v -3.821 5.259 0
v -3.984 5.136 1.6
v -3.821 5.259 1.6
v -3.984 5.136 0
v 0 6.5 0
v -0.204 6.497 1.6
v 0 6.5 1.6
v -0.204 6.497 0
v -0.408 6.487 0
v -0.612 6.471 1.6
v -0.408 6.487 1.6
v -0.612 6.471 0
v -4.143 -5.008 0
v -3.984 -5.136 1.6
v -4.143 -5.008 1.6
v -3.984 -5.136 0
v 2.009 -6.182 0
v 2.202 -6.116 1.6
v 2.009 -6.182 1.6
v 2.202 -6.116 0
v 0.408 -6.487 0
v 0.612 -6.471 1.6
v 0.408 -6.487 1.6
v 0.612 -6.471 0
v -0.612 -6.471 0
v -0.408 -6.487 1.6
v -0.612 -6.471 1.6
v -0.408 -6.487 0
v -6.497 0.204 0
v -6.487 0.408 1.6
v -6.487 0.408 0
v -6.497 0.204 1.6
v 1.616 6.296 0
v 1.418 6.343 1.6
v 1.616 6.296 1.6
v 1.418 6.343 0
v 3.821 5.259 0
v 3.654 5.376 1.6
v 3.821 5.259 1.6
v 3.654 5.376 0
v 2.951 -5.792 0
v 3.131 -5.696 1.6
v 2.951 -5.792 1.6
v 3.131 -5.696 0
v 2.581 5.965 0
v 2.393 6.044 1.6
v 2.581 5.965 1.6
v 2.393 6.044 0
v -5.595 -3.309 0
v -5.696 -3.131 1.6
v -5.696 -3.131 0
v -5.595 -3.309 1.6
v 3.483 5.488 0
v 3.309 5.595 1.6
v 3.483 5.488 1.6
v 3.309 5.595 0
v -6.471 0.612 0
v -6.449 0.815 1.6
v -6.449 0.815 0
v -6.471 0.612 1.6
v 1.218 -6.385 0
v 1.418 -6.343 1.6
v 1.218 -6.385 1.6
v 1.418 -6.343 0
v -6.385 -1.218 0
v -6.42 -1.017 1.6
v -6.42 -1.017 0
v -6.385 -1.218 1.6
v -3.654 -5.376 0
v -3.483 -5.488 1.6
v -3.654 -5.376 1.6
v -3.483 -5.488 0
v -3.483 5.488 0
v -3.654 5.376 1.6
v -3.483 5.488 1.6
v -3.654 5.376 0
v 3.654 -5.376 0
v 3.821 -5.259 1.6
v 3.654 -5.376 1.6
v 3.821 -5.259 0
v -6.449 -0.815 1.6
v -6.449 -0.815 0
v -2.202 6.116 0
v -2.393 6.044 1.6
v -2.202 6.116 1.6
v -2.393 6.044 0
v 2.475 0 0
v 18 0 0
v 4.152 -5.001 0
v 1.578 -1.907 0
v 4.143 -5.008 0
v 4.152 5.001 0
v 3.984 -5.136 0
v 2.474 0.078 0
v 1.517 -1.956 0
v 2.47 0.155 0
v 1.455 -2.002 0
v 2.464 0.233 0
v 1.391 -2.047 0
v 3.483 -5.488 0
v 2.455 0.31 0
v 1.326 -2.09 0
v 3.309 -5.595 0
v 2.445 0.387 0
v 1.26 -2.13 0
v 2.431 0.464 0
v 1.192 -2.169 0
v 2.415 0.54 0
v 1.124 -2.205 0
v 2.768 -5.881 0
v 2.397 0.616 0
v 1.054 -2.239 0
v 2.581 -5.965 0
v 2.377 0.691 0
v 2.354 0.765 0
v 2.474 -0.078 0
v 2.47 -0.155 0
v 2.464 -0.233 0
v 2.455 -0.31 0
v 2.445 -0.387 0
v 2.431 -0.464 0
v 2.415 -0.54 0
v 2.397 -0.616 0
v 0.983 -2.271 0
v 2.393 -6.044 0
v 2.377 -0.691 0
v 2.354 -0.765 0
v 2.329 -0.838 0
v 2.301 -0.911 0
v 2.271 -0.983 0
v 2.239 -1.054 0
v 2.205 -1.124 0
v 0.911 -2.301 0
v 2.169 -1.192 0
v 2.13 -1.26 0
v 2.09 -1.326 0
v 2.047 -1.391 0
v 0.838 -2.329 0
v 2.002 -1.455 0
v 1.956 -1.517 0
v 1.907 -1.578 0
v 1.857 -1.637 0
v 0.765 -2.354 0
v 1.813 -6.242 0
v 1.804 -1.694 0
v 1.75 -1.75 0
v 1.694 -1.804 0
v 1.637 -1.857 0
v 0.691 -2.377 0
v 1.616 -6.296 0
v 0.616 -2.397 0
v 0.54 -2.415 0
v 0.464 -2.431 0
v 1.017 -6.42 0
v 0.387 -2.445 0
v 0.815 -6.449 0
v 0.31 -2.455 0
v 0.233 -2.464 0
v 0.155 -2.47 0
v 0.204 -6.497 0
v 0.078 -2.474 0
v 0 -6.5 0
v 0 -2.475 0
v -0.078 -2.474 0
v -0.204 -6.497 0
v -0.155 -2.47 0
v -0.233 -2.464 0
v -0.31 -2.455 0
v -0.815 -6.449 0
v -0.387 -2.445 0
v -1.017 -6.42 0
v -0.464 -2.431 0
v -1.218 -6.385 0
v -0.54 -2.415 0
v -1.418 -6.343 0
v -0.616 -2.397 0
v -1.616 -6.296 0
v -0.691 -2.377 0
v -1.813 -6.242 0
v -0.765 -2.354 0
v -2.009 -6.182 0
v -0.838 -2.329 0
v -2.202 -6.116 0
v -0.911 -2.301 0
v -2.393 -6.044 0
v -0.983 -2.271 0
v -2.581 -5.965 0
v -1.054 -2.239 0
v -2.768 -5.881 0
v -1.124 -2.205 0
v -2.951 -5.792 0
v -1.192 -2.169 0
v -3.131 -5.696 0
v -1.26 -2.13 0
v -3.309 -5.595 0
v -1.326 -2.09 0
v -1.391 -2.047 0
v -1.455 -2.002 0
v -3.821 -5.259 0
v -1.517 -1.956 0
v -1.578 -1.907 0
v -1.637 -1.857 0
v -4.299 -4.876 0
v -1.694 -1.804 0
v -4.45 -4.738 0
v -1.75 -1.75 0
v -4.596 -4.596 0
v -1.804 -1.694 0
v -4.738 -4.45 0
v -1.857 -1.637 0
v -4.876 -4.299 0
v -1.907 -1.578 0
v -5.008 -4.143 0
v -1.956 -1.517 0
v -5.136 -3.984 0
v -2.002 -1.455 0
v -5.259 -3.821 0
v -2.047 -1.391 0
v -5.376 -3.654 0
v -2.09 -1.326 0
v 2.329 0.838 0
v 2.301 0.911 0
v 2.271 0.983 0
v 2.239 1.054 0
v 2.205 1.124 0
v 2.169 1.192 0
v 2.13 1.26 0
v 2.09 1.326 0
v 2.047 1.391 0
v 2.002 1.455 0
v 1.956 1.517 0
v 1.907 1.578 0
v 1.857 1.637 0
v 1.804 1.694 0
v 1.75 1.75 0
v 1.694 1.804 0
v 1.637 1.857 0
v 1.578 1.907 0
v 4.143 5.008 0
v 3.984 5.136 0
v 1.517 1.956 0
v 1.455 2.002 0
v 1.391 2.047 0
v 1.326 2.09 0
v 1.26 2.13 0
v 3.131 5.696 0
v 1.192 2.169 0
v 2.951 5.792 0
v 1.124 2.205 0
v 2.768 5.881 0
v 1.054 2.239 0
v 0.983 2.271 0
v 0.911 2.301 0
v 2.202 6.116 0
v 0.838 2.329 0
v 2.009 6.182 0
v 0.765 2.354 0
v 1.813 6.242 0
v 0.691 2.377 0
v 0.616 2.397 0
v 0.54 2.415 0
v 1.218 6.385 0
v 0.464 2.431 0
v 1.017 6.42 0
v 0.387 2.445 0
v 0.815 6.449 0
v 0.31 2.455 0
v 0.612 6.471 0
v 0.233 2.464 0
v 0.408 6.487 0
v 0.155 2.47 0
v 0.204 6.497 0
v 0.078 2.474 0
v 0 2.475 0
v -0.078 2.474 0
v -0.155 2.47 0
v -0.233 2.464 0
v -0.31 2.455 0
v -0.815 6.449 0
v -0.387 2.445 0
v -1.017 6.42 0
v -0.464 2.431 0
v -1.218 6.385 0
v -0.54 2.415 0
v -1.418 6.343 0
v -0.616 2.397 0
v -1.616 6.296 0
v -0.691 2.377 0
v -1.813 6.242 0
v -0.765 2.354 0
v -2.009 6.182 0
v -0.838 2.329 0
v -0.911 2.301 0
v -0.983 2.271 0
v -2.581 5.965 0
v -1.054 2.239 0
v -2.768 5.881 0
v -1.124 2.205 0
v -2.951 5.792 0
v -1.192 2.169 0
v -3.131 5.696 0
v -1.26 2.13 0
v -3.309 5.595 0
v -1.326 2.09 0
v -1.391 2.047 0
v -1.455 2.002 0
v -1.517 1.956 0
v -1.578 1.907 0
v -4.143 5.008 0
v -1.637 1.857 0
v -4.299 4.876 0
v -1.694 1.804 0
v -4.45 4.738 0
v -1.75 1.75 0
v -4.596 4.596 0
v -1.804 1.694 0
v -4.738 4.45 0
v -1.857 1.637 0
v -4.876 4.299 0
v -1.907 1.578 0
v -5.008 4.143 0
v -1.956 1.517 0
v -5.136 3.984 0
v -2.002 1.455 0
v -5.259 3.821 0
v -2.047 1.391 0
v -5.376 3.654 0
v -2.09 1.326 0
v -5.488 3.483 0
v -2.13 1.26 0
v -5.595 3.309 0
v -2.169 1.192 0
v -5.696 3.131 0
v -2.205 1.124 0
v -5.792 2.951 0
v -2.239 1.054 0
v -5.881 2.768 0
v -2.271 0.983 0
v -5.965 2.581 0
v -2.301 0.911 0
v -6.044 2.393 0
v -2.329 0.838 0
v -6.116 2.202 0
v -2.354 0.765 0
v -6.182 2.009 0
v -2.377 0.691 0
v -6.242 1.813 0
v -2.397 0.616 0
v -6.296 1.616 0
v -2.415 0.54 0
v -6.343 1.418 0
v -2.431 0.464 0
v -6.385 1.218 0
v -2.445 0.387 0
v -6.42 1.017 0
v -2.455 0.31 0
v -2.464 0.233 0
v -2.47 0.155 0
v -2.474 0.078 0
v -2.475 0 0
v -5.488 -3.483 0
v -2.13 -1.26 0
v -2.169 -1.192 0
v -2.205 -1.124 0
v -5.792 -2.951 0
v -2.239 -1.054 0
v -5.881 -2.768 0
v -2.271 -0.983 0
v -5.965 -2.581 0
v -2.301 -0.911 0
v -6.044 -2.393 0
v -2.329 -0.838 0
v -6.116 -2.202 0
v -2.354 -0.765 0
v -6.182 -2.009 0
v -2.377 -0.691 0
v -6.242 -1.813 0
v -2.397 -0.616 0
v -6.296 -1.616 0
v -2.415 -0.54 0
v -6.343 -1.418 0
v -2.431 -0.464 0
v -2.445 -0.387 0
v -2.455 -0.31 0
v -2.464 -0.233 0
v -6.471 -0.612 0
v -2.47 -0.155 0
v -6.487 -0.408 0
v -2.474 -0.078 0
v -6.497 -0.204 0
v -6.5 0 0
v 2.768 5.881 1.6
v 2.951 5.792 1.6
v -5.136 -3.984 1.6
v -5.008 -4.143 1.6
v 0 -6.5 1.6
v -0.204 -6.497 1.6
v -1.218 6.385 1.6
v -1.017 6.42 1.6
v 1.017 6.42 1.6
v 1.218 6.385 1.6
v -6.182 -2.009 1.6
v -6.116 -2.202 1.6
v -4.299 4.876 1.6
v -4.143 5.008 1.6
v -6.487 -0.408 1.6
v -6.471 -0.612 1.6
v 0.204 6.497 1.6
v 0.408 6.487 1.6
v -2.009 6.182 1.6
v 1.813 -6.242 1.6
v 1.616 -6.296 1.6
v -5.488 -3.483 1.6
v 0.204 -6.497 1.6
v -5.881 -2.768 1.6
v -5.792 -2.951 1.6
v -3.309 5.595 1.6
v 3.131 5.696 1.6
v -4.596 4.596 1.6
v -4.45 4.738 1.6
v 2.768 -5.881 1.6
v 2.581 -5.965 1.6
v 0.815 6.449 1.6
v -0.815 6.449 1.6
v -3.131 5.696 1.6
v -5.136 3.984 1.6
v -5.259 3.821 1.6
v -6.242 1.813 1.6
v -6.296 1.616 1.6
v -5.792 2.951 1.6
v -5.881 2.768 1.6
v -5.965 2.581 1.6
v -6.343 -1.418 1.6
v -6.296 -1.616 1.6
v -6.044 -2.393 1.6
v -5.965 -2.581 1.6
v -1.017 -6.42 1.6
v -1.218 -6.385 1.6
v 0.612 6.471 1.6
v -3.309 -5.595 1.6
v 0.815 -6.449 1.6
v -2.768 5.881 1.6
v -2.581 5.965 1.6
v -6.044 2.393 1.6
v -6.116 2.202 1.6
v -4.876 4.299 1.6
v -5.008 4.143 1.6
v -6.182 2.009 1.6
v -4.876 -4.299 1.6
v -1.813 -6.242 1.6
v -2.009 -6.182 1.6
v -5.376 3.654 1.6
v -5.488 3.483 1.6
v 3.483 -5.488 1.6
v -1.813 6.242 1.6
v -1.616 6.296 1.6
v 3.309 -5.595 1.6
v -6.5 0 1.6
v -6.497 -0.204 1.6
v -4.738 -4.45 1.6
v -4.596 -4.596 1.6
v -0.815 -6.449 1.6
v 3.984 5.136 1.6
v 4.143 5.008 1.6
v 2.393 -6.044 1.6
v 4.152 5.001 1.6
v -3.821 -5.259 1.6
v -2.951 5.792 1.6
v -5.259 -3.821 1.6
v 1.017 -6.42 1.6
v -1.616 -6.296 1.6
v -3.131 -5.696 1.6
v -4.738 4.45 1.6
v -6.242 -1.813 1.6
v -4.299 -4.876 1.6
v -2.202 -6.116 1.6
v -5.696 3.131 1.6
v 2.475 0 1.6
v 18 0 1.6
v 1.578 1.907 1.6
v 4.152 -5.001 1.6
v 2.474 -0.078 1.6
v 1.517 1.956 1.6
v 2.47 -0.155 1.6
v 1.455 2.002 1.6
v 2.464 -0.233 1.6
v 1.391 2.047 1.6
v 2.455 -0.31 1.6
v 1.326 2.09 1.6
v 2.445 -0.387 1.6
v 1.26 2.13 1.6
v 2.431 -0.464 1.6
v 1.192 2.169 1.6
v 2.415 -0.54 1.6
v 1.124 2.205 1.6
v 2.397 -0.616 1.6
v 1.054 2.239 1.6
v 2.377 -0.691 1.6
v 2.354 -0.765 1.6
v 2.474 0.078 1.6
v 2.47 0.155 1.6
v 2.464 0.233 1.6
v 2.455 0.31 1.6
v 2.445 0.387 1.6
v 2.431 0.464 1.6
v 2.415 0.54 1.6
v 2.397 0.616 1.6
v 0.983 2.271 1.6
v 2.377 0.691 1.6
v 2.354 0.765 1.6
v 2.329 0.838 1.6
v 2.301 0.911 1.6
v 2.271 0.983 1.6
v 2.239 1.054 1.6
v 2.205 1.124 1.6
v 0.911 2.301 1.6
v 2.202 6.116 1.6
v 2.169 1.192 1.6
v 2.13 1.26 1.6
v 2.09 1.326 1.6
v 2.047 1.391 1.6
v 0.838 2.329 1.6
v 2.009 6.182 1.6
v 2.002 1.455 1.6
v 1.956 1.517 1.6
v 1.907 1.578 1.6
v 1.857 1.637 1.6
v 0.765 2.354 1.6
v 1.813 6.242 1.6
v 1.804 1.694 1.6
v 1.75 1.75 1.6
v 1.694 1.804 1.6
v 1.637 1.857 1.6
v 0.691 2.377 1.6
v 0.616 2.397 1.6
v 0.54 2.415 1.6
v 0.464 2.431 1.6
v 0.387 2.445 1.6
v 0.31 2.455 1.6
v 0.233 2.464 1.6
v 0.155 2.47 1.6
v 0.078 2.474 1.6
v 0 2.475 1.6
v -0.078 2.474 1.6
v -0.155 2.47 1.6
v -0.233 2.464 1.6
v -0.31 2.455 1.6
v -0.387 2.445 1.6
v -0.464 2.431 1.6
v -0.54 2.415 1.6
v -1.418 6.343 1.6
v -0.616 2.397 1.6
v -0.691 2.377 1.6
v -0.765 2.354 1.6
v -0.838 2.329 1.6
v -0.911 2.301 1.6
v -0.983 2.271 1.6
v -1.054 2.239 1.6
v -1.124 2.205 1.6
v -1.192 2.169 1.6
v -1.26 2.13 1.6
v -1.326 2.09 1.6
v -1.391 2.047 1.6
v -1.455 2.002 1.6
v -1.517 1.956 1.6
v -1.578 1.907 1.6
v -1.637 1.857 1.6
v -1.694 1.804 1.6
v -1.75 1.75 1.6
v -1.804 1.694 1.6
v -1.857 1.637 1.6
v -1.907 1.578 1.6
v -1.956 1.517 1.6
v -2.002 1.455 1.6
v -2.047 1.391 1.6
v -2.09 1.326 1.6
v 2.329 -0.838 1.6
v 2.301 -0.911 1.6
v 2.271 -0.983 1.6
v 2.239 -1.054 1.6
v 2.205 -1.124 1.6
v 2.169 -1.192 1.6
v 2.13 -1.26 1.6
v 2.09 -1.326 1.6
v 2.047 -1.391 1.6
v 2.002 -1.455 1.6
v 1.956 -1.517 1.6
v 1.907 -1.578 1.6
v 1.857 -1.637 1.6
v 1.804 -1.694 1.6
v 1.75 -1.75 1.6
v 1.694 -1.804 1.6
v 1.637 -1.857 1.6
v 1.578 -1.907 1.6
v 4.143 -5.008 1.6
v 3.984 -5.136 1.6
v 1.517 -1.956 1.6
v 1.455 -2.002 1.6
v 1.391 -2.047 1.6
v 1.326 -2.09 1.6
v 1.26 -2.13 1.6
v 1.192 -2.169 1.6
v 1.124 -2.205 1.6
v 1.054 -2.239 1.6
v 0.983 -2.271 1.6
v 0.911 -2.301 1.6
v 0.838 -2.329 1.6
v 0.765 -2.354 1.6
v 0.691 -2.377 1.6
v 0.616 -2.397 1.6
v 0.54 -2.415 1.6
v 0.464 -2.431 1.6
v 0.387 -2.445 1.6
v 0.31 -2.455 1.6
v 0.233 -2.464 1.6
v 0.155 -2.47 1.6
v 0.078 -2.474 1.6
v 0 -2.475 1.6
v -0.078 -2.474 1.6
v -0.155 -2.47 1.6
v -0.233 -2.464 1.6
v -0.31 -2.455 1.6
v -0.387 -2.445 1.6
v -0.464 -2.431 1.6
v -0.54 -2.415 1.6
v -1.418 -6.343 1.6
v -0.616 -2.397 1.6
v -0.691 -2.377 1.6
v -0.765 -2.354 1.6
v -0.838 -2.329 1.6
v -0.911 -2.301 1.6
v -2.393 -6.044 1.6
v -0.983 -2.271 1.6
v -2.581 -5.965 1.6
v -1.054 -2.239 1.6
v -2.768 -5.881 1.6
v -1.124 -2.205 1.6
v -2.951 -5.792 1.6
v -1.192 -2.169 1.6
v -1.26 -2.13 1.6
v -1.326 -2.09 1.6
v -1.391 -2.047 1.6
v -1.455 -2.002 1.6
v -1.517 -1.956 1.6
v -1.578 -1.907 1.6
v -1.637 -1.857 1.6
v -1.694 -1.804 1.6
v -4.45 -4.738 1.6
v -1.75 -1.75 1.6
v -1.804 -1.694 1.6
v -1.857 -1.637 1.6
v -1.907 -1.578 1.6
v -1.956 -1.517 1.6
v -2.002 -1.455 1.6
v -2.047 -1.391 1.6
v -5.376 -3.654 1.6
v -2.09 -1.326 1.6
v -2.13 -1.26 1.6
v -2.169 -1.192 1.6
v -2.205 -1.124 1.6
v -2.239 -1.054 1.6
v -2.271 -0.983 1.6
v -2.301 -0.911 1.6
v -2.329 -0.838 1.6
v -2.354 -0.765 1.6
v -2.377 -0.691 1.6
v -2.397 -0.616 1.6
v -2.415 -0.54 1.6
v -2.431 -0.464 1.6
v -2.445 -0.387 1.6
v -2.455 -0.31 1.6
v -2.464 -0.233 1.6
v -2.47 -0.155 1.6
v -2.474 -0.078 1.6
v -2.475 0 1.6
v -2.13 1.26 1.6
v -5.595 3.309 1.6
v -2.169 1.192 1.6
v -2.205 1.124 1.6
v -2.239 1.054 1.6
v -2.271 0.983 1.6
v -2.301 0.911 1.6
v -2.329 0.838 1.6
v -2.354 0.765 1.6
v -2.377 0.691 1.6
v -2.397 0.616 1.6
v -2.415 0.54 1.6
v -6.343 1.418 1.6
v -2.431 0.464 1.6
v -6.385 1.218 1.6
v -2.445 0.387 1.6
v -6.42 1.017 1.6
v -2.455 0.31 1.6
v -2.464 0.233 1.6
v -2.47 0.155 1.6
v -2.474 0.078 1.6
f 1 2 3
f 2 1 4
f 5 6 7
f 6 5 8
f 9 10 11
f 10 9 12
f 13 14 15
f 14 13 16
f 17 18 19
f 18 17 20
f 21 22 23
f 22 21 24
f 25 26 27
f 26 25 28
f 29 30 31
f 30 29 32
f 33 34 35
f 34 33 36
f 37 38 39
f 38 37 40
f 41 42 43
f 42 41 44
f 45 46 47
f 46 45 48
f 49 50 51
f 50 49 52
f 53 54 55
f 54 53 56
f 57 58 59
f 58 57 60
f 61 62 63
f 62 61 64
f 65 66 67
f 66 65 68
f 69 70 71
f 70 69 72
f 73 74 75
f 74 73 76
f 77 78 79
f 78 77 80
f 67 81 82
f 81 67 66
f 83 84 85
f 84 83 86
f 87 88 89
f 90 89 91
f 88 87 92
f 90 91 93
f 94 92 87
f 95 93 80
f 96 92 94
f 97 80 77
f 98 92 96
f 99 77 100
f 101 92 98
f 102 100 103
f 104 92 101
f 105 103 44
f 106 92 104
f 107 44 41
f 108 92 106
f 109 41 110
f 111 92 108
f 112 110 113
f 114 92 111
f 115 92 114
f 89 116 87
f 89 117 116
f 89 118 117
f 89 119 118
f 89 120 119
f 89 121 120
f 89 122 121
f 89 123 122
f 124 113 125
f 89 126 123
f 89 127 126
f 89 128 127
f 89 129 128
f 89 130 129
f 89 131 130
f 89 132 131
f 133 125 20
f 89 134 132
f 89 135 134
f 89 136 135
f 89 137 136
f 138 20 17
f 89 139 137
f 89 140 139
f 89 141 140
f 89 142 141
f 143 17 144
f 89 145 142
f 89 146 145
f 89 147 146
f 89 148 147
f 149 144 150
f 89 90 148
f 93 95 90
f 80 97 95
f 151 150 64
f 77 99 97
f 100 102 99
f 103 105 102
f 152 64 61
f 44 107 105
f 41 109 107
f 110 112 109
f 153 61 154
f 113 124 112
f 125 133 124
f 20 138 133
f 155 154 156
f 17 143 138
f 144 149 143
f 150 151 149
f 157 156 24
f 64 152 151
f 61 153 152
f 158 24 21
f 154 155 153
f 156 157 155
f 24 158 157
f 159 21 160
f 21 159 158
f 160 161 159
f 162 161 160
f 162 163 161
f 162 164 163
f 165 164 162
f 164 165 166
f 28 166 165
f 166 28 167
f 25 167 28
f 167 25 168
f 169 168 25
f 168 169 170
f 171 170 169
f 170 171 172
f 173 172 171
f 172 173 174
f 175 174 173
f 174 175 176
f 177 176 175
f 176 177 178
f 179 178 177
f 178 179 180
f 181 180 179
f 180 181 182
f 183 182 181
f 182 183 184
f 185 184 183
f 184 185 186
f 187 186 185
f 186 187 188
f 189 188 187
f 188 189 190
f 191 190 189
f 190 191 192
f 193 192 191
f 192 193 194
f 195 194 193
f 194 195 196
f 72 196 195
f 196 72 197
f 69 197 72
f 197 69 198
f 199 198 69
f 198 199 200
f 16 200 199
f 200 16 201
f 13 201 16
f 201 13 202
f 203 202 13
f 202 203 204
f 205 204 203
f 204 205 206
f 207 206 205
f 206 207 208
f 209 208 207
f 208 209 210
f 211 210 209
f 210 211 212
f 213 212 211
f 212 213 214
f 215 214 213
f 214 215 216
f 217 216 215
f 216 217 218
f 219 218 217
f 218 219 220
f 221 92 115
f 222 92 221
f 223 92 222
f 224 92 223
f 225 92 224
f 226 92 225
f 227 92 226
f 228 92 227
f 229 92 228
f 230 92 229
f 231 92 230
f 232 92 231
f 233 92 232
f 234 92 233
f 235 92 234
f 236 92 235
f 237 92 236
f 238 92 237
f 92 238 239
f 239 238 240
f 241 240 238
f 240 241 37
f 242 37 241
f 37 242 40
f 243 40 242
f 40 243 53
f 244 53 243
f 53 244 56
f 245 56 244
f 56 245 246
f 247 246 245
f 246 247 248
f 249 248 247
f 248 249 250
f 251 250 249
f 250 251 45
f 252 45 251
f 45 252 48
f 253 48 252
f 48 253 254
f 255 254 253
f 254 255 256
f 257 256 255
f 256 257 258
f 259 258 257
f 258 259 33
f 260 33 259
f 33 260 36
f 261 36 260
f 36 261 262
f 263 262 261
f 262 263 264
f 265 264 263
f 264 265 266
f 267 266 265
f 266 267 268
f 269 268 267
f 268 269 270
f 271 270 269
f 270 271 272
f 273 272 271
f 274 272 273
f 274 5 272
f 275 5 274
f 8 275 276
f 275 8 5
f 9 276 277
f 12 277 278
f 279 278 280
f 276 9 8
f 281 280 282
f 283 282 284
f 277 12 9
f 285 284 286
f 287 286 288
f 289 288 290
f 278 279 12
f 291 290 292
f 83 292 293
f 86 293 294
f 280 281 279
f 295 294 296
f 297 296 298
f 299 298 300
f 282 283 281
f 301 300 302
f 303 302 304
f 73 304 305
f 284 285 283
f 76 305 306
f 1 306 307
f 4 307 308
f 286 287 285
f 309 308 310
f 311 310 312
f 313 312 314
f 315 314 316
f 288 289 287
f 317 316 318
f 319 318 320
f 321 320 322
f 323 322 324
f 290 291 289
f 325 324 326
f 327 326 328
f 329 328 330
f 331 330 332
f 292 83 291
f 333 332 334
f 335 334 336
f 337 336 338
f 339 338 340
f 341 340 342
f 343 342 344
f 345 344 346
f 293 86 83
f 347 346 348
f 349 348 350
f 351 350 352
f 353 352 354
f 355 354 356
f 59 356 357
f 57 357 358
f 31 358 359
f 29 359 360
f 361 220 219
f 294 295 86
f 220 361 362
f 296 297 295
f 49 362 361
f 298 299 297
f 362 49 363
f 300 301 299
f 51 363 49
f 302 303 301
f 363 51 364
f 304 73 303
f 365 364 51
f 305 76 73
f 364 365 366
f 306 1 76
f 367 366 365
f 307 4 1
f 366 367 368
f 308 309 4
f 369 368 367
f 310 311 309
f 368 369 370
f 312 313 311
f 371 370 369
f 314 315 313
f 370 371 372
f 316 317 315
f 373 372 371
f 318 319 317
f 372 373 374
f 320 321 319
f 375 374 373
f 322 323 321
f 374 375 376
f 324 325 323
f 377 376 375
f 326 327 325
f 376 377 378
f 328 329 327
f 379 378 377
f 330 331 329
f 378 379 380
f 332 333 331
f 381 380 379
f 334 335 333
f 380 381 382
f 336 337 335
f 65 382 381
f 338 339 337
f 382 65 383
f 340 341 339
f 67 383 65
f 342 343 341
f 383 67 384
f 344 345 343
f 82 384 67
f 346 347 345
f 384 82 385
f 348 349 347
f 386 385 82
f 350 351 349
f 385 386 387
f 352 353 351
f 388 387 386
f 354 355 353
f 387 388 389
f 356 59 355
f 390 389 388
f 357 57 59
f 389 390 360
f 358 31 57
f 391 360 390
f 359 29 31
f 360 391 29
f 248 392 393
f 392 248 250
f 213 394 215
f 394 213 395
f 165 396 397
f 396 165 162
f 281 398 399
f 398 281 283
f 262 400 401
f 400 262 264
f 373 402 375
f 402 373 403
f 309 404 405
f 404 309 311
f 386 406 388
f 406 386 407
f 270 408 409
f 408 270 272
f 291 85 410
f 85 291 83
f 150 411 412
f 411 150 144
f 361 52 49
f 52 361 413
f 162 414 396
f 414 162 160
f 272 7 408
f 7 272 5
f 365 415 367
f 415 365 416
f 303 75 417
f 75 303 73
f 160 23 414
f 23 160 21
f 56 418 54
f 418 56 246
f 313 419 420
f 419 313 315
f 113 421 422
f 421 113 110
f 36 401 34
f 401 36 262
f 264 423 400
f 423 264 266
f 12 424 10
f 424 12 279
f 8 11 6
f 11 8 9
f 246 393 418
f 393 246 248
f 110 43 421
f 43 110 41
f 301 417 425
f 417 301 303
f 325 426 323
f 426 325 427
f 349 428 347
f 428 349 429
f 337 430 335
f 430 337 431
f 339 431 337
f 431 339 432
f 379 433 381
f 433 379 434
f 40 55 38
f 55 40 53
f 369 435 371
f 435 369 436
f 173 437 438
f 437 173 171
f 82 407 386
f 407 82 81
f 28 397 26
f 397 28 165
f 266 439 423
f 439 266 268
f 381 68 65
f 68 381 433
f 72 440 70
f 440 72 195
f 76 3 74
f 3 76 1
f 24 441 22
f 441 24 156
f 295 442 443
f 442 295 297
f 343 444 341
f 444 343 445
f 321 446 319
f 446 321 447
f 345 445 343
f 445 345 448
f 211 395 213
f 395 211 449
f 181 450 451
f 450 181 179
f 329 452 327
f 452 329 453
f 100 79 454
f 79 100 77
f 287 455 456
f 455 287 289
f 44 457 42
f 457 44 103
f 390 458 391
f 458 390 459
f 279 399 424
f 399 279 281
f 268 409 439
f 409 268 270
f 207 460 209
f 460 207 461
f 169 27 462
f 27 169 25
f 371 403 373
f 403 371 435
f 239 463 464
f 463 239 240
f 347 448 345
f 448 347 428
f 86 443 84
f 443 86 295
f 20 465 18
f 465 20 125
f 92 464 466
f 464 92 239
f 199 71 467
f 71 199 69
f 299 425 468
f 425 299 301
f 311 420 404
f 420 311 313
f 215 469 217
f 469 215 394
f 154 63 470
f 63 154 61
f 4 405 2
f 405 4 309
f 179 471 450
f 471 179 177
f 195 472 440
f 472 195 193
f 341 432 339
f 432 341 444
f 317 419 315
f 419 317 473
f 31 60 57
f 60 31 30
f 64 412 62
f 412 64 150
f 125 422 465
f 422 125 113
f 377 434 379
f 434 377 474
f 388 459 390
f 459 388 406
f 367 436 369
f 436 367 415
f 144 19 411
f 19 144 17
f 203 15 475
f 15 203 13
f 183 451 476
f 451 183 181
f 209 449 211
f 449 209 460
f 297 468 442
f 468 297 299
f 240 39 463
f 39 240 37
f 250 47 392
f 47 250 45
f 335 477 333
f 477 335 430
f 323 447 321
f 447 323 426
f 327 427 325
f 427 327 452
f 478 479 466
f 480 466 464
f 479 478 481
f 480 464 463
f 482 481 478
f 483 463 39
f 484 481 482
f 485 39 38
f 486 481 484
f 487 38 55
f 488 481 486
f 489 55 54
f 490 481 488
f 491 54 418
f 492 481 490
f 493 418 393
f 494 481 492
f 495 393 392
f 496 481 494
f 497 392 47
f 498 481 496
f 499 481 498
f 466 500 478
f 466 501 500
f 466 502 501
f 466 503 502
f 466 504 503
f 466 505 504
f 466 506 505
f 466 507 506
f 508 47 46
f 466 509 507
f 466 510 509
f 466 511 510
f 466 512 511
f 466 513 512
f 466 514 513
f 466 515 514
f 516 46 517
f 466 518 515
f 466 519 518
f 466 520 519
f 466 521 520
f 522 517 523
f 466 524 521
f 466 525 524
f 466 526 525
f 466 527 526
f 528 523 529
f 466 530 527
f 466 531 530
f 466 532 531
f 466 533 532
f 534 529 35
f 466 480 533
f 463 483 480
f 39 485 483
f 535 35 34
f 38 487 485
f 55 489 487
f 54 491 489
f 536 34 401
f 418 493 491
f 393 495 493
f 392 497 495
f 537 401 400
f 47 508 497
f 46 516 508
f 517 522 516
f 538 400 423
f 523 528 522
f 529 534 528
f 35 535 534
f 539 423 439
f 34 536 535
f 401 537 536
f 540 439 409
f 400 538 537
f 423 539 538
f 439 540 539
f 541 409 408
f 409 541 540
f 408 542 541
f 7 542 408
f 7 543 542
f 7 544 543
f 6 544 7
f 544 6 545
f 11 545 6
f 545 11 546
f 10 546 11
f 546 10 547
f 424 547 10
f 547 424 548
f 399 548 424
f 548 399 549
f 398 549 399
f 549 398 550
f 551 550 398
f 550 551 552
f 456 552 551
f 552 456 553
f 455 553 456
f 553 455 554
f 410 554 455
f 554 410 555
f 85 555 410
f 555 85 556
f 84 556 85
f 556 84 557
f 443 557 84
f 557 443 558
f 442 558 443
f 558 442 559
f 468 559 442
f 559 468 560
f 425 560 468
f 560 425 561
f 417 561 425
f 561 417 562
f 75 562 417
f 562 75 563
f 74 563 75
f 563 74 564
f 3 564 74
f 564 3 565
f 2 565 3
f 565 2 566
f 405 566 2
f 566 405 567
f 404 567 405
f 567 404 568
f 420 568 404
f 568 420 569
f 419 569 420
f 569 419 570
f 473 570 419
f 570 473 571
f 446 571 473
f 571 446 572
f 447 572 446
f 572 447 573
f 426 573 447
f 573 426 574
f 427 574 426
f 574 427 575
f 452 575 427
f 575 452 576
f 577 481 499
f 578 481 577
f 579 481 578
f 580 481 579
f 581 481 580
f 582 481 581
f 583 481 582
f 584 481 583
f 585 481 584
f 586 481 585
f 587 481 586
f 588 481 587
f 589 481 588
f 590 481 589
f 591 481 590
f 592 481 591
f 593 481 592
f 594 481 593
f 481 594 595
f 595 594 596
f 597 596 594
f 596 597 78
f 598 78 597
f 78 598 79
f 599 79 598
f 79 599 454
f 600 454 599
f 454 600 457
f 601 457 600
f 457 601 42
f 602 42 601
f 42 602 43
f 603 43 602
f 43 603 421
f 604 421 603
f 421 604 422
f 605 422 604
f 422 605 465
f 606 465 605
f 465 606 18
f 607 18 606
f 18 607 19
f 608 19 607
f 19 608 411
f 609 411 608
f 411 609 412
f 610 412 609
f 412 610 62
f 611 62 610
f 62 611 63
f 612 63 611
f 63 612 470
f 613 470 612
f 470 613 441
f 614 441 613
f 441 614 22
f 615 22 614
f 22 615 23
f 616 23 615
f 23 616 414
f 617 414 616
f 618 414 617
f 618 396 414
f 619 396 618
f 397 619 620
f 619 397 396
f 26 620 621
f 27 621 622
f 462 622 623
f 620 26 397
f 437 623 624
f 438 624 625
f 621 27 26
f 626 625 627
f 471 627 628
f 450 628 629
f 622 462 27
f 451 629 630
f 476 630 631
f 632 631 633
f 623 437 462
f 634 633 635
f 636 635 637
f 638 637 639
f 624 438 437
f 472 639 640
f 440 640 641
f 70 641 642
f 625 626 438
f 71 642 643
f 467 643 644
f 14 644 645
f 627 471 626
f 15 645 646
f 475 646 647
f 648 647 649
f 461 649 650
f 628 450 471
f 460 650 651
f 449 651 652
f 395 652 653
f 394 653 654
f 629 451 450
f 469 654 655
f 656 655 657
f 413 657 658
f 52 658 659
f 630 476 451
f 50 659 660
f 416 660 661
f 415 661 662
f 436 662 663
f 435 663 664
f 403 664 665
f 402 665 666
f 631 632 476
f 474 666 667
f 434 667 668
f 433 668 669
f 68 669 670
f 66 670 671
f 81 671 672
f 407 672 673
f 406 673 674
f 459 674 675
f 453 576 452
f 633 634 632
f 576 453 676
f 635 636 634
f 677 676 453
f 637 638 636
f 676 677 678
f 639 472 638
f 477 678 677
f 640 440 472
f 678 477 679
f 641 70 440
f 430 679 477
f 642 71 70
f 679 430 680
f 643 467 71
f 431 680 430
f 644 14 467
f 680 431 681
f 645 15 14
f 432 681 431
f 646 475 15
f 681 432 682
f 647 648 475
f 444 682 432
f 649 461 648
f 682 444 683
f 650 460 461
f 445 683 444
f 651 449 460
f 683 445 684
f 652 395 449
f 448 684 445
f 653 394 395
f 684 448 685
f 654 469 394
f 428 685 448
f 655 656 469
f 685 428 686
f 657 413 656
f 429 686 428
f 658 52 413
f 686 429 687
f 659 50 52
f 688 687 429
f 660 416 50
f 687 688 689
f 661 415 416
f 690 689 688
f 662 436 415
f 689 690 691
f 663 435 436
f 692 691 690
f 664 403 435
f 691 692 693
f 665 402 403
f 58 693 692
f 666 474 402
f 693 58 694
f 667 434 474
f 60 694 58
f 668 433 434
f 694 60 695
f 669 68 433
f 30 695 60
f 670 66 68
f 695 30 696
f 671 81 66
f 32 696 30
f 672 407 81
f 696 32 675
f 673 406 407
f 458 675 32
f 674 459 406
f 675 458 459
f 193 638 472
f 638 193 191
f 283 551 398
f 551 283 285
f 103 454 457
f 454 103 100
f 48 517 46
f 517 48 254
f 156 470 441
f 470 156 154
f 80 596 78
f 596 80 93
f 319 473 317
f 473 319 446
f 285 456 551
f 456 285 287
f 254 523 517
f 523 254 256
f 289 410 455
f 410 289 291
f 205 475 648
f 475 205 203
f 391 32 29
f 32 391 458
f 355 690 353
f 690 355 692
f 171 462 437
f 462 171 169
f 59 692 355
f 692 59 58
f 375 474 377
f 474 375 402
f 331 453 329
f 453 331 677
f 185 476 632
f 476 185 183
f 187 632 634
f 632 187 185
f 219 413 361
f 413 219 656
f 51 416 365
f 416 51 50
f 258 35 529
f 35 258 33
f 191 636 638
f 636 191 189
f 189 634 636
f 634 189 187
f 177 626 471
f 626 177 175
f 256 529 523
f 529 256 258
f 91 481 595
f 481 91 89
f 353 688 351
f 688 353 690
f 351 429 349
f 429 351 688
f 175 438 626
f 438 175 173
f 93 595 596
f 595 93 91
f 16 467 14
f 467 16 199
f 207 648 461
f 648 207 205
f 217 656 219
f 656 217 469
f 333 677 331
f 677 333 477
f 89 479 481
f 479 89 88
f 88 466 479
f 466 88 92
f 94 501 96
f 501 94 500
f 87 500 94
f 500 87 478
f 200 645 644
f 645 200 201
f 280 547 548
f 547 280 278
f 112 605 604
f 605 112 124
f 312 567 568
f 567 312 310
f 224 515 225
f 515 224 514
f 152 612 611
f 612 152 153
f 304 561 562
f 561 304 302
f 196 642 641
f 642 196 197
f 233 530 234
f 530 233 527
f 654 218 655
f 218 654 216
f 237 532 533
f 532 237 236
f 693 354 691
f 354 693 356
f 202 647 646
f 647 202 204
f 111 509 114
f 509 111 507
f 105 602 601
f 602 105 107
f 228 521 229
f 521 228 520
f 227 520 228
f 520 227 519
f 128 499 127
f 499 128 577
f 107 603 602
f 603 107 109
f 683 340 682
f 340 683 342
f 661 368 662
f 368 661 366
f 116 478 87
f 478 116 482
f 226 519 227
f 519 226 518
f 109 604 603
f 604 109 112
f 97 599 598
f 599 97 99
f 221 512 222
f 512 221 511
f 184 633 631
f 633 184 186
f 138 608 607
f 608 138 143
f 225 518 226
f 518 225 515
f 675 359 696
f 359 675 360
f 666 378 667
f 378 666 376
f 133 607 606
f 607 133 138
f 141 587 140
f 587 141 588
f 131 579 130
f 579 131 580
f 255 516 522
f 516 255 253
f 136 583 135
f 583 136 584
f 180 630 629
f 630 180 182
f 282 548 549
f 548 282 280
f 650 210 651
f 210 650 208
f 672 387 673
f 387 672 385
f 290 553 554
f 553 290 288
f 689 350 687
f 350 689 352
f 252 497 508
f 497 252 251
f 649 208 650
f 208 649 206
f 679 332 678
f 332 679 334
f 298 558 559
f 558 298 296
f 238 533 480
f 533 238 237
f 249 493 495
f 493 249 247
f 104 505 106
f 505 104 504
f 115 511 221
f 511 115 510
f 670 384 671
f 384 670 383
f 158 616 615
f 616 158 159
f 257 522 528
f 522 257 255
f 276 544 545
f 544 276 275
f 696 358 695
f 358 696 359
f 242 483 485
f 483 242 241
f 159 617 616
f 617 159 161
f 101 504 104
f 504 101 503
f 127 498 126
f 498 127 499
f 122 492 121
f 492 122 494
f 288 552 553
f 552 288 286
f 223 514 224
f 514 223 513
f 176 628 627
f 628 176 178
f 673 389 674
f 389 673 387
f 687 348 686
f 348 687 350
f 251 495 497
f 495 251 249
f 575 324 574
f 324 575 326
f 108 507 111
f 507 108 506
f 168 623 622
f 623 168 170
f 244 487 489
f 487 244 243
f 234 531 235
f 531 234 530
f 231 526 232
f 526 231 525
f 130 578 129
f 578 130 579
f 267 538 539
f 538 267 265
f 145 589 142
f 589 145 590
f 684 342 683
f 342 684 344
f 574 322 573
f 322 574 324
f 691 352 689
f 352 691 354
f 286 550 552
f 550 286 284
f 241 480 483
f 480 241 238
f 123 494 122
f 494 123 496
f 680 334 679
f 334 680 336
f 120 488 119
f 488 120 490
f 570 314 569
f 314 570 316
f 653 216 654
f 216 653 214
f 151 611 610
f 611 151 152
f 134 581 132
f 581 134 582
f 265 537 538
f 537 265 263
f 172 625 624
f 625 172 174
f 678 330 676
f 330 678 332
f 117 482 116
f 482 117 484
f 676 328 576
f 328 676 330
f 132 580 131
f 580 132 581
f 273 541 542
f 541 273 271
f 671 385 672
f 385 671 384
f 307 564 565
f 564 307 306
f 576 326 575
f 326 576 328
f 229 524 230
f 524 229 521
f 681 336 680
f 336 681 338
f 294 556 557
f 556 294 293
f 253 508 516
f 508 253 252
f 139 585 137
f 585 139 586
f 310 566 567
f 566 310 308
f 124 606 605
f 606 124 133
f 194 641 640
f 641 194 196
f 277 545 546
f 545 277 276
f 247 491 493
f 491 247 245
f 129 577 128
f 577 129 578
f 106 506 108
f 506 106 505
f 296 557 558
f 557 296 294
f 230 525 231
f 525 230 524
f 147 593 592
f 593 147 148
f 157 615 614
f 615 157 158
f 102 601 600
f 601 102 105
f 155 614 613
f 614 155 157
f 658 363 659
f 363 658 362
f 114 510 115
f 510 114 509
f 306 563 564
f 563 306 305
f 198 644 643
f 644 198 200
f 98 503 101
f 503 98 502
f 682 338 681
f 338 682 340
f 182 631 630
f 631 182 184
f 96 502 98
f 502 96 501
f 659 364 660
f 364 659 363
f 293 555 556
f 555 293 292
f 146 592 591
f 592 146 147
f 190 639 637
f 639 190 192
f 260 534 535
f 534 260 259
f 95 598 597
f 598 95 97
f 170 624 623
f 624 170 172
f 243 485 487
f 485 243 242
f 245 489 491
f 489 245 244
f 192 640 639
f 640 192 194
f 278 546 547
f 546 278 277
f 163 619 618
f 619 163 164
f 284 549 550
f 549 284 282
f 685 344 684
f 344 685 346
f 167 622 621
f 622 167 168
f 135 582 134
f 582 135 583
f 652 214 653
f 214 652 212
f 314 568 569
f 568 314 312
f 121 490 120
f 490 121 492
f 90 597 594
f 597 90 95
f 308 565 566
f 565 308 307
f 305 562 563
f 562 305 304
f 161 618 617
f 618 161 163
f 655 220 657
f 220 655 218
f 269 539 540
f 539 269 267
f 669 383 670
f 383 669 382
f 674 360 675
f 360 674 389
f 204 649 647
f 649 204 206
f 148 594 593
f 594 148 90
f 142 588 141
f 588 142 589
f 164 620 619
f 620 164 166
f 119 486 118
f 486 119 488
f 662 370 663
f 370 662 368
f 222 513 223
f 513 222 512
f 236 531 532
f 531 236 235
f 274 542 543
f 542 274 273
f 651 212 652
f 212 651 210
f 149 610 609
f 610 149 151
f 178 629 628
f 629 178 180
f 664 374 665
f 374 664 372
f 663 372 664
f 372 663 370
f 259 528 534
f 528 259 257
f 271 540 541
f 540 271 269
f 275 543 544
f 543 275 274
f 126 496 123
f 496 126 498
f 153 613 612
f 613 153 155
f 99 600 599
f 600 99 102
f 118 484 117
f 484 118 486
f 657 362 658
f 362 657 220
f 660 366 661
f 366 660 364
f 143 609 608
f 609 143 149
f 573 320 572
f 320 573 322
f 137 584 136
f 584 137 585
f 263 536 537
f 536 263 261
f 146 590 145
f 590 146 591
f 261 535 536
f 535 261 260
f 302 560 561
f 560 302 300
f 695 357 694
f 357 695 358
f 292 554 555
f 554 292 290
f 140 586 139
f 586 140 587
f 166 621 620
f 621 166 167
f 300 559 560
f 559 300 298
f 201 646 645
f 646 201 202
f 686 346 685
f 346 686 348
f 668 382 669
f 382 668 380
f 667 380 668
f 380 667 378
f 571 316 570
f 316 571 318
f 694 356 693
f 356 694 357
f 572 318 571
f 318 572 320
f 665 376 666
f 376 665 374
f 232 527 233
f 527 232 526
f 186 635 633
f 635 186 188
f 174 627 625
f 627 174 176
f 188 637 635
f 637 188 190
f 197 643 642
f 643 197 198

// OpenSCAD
hold_down_height = 1.6;
hold_down_diameter = 13;
hold_down_reach = 18;
hold_down_screw_diameter = 4.95;

//
// This is a vaguely teardrop shaped hold-down clamp to hold a pcb workpiece
// flat in the cavity of pcb_work_bracket
//
// h=height of the clamp
// d=outside diameter of the screwed-down part
// r=reach of the pointy bit
// sd=screw diameter
//
// contributed by @vathpela
//
module pcb_hold_down(h=hold_down_height,
                     d=hold_down_diameter,
                     r=hold_down_reach,
                     sd=hold_down_screw_diameter,
                     $fn=200)
{
    difference()
    {
        union()
        {
            cylinder(h=h, d=d);
            linear_extrude(height=h)
                polygon([[0, d/2],
                         [0, -d/2],
                         [r, 0]]);
        }
        translate([0, 0, -0.01])
            cylinder(h=h+0.02, d=sd);
    }
}

pcb_hold_down();
